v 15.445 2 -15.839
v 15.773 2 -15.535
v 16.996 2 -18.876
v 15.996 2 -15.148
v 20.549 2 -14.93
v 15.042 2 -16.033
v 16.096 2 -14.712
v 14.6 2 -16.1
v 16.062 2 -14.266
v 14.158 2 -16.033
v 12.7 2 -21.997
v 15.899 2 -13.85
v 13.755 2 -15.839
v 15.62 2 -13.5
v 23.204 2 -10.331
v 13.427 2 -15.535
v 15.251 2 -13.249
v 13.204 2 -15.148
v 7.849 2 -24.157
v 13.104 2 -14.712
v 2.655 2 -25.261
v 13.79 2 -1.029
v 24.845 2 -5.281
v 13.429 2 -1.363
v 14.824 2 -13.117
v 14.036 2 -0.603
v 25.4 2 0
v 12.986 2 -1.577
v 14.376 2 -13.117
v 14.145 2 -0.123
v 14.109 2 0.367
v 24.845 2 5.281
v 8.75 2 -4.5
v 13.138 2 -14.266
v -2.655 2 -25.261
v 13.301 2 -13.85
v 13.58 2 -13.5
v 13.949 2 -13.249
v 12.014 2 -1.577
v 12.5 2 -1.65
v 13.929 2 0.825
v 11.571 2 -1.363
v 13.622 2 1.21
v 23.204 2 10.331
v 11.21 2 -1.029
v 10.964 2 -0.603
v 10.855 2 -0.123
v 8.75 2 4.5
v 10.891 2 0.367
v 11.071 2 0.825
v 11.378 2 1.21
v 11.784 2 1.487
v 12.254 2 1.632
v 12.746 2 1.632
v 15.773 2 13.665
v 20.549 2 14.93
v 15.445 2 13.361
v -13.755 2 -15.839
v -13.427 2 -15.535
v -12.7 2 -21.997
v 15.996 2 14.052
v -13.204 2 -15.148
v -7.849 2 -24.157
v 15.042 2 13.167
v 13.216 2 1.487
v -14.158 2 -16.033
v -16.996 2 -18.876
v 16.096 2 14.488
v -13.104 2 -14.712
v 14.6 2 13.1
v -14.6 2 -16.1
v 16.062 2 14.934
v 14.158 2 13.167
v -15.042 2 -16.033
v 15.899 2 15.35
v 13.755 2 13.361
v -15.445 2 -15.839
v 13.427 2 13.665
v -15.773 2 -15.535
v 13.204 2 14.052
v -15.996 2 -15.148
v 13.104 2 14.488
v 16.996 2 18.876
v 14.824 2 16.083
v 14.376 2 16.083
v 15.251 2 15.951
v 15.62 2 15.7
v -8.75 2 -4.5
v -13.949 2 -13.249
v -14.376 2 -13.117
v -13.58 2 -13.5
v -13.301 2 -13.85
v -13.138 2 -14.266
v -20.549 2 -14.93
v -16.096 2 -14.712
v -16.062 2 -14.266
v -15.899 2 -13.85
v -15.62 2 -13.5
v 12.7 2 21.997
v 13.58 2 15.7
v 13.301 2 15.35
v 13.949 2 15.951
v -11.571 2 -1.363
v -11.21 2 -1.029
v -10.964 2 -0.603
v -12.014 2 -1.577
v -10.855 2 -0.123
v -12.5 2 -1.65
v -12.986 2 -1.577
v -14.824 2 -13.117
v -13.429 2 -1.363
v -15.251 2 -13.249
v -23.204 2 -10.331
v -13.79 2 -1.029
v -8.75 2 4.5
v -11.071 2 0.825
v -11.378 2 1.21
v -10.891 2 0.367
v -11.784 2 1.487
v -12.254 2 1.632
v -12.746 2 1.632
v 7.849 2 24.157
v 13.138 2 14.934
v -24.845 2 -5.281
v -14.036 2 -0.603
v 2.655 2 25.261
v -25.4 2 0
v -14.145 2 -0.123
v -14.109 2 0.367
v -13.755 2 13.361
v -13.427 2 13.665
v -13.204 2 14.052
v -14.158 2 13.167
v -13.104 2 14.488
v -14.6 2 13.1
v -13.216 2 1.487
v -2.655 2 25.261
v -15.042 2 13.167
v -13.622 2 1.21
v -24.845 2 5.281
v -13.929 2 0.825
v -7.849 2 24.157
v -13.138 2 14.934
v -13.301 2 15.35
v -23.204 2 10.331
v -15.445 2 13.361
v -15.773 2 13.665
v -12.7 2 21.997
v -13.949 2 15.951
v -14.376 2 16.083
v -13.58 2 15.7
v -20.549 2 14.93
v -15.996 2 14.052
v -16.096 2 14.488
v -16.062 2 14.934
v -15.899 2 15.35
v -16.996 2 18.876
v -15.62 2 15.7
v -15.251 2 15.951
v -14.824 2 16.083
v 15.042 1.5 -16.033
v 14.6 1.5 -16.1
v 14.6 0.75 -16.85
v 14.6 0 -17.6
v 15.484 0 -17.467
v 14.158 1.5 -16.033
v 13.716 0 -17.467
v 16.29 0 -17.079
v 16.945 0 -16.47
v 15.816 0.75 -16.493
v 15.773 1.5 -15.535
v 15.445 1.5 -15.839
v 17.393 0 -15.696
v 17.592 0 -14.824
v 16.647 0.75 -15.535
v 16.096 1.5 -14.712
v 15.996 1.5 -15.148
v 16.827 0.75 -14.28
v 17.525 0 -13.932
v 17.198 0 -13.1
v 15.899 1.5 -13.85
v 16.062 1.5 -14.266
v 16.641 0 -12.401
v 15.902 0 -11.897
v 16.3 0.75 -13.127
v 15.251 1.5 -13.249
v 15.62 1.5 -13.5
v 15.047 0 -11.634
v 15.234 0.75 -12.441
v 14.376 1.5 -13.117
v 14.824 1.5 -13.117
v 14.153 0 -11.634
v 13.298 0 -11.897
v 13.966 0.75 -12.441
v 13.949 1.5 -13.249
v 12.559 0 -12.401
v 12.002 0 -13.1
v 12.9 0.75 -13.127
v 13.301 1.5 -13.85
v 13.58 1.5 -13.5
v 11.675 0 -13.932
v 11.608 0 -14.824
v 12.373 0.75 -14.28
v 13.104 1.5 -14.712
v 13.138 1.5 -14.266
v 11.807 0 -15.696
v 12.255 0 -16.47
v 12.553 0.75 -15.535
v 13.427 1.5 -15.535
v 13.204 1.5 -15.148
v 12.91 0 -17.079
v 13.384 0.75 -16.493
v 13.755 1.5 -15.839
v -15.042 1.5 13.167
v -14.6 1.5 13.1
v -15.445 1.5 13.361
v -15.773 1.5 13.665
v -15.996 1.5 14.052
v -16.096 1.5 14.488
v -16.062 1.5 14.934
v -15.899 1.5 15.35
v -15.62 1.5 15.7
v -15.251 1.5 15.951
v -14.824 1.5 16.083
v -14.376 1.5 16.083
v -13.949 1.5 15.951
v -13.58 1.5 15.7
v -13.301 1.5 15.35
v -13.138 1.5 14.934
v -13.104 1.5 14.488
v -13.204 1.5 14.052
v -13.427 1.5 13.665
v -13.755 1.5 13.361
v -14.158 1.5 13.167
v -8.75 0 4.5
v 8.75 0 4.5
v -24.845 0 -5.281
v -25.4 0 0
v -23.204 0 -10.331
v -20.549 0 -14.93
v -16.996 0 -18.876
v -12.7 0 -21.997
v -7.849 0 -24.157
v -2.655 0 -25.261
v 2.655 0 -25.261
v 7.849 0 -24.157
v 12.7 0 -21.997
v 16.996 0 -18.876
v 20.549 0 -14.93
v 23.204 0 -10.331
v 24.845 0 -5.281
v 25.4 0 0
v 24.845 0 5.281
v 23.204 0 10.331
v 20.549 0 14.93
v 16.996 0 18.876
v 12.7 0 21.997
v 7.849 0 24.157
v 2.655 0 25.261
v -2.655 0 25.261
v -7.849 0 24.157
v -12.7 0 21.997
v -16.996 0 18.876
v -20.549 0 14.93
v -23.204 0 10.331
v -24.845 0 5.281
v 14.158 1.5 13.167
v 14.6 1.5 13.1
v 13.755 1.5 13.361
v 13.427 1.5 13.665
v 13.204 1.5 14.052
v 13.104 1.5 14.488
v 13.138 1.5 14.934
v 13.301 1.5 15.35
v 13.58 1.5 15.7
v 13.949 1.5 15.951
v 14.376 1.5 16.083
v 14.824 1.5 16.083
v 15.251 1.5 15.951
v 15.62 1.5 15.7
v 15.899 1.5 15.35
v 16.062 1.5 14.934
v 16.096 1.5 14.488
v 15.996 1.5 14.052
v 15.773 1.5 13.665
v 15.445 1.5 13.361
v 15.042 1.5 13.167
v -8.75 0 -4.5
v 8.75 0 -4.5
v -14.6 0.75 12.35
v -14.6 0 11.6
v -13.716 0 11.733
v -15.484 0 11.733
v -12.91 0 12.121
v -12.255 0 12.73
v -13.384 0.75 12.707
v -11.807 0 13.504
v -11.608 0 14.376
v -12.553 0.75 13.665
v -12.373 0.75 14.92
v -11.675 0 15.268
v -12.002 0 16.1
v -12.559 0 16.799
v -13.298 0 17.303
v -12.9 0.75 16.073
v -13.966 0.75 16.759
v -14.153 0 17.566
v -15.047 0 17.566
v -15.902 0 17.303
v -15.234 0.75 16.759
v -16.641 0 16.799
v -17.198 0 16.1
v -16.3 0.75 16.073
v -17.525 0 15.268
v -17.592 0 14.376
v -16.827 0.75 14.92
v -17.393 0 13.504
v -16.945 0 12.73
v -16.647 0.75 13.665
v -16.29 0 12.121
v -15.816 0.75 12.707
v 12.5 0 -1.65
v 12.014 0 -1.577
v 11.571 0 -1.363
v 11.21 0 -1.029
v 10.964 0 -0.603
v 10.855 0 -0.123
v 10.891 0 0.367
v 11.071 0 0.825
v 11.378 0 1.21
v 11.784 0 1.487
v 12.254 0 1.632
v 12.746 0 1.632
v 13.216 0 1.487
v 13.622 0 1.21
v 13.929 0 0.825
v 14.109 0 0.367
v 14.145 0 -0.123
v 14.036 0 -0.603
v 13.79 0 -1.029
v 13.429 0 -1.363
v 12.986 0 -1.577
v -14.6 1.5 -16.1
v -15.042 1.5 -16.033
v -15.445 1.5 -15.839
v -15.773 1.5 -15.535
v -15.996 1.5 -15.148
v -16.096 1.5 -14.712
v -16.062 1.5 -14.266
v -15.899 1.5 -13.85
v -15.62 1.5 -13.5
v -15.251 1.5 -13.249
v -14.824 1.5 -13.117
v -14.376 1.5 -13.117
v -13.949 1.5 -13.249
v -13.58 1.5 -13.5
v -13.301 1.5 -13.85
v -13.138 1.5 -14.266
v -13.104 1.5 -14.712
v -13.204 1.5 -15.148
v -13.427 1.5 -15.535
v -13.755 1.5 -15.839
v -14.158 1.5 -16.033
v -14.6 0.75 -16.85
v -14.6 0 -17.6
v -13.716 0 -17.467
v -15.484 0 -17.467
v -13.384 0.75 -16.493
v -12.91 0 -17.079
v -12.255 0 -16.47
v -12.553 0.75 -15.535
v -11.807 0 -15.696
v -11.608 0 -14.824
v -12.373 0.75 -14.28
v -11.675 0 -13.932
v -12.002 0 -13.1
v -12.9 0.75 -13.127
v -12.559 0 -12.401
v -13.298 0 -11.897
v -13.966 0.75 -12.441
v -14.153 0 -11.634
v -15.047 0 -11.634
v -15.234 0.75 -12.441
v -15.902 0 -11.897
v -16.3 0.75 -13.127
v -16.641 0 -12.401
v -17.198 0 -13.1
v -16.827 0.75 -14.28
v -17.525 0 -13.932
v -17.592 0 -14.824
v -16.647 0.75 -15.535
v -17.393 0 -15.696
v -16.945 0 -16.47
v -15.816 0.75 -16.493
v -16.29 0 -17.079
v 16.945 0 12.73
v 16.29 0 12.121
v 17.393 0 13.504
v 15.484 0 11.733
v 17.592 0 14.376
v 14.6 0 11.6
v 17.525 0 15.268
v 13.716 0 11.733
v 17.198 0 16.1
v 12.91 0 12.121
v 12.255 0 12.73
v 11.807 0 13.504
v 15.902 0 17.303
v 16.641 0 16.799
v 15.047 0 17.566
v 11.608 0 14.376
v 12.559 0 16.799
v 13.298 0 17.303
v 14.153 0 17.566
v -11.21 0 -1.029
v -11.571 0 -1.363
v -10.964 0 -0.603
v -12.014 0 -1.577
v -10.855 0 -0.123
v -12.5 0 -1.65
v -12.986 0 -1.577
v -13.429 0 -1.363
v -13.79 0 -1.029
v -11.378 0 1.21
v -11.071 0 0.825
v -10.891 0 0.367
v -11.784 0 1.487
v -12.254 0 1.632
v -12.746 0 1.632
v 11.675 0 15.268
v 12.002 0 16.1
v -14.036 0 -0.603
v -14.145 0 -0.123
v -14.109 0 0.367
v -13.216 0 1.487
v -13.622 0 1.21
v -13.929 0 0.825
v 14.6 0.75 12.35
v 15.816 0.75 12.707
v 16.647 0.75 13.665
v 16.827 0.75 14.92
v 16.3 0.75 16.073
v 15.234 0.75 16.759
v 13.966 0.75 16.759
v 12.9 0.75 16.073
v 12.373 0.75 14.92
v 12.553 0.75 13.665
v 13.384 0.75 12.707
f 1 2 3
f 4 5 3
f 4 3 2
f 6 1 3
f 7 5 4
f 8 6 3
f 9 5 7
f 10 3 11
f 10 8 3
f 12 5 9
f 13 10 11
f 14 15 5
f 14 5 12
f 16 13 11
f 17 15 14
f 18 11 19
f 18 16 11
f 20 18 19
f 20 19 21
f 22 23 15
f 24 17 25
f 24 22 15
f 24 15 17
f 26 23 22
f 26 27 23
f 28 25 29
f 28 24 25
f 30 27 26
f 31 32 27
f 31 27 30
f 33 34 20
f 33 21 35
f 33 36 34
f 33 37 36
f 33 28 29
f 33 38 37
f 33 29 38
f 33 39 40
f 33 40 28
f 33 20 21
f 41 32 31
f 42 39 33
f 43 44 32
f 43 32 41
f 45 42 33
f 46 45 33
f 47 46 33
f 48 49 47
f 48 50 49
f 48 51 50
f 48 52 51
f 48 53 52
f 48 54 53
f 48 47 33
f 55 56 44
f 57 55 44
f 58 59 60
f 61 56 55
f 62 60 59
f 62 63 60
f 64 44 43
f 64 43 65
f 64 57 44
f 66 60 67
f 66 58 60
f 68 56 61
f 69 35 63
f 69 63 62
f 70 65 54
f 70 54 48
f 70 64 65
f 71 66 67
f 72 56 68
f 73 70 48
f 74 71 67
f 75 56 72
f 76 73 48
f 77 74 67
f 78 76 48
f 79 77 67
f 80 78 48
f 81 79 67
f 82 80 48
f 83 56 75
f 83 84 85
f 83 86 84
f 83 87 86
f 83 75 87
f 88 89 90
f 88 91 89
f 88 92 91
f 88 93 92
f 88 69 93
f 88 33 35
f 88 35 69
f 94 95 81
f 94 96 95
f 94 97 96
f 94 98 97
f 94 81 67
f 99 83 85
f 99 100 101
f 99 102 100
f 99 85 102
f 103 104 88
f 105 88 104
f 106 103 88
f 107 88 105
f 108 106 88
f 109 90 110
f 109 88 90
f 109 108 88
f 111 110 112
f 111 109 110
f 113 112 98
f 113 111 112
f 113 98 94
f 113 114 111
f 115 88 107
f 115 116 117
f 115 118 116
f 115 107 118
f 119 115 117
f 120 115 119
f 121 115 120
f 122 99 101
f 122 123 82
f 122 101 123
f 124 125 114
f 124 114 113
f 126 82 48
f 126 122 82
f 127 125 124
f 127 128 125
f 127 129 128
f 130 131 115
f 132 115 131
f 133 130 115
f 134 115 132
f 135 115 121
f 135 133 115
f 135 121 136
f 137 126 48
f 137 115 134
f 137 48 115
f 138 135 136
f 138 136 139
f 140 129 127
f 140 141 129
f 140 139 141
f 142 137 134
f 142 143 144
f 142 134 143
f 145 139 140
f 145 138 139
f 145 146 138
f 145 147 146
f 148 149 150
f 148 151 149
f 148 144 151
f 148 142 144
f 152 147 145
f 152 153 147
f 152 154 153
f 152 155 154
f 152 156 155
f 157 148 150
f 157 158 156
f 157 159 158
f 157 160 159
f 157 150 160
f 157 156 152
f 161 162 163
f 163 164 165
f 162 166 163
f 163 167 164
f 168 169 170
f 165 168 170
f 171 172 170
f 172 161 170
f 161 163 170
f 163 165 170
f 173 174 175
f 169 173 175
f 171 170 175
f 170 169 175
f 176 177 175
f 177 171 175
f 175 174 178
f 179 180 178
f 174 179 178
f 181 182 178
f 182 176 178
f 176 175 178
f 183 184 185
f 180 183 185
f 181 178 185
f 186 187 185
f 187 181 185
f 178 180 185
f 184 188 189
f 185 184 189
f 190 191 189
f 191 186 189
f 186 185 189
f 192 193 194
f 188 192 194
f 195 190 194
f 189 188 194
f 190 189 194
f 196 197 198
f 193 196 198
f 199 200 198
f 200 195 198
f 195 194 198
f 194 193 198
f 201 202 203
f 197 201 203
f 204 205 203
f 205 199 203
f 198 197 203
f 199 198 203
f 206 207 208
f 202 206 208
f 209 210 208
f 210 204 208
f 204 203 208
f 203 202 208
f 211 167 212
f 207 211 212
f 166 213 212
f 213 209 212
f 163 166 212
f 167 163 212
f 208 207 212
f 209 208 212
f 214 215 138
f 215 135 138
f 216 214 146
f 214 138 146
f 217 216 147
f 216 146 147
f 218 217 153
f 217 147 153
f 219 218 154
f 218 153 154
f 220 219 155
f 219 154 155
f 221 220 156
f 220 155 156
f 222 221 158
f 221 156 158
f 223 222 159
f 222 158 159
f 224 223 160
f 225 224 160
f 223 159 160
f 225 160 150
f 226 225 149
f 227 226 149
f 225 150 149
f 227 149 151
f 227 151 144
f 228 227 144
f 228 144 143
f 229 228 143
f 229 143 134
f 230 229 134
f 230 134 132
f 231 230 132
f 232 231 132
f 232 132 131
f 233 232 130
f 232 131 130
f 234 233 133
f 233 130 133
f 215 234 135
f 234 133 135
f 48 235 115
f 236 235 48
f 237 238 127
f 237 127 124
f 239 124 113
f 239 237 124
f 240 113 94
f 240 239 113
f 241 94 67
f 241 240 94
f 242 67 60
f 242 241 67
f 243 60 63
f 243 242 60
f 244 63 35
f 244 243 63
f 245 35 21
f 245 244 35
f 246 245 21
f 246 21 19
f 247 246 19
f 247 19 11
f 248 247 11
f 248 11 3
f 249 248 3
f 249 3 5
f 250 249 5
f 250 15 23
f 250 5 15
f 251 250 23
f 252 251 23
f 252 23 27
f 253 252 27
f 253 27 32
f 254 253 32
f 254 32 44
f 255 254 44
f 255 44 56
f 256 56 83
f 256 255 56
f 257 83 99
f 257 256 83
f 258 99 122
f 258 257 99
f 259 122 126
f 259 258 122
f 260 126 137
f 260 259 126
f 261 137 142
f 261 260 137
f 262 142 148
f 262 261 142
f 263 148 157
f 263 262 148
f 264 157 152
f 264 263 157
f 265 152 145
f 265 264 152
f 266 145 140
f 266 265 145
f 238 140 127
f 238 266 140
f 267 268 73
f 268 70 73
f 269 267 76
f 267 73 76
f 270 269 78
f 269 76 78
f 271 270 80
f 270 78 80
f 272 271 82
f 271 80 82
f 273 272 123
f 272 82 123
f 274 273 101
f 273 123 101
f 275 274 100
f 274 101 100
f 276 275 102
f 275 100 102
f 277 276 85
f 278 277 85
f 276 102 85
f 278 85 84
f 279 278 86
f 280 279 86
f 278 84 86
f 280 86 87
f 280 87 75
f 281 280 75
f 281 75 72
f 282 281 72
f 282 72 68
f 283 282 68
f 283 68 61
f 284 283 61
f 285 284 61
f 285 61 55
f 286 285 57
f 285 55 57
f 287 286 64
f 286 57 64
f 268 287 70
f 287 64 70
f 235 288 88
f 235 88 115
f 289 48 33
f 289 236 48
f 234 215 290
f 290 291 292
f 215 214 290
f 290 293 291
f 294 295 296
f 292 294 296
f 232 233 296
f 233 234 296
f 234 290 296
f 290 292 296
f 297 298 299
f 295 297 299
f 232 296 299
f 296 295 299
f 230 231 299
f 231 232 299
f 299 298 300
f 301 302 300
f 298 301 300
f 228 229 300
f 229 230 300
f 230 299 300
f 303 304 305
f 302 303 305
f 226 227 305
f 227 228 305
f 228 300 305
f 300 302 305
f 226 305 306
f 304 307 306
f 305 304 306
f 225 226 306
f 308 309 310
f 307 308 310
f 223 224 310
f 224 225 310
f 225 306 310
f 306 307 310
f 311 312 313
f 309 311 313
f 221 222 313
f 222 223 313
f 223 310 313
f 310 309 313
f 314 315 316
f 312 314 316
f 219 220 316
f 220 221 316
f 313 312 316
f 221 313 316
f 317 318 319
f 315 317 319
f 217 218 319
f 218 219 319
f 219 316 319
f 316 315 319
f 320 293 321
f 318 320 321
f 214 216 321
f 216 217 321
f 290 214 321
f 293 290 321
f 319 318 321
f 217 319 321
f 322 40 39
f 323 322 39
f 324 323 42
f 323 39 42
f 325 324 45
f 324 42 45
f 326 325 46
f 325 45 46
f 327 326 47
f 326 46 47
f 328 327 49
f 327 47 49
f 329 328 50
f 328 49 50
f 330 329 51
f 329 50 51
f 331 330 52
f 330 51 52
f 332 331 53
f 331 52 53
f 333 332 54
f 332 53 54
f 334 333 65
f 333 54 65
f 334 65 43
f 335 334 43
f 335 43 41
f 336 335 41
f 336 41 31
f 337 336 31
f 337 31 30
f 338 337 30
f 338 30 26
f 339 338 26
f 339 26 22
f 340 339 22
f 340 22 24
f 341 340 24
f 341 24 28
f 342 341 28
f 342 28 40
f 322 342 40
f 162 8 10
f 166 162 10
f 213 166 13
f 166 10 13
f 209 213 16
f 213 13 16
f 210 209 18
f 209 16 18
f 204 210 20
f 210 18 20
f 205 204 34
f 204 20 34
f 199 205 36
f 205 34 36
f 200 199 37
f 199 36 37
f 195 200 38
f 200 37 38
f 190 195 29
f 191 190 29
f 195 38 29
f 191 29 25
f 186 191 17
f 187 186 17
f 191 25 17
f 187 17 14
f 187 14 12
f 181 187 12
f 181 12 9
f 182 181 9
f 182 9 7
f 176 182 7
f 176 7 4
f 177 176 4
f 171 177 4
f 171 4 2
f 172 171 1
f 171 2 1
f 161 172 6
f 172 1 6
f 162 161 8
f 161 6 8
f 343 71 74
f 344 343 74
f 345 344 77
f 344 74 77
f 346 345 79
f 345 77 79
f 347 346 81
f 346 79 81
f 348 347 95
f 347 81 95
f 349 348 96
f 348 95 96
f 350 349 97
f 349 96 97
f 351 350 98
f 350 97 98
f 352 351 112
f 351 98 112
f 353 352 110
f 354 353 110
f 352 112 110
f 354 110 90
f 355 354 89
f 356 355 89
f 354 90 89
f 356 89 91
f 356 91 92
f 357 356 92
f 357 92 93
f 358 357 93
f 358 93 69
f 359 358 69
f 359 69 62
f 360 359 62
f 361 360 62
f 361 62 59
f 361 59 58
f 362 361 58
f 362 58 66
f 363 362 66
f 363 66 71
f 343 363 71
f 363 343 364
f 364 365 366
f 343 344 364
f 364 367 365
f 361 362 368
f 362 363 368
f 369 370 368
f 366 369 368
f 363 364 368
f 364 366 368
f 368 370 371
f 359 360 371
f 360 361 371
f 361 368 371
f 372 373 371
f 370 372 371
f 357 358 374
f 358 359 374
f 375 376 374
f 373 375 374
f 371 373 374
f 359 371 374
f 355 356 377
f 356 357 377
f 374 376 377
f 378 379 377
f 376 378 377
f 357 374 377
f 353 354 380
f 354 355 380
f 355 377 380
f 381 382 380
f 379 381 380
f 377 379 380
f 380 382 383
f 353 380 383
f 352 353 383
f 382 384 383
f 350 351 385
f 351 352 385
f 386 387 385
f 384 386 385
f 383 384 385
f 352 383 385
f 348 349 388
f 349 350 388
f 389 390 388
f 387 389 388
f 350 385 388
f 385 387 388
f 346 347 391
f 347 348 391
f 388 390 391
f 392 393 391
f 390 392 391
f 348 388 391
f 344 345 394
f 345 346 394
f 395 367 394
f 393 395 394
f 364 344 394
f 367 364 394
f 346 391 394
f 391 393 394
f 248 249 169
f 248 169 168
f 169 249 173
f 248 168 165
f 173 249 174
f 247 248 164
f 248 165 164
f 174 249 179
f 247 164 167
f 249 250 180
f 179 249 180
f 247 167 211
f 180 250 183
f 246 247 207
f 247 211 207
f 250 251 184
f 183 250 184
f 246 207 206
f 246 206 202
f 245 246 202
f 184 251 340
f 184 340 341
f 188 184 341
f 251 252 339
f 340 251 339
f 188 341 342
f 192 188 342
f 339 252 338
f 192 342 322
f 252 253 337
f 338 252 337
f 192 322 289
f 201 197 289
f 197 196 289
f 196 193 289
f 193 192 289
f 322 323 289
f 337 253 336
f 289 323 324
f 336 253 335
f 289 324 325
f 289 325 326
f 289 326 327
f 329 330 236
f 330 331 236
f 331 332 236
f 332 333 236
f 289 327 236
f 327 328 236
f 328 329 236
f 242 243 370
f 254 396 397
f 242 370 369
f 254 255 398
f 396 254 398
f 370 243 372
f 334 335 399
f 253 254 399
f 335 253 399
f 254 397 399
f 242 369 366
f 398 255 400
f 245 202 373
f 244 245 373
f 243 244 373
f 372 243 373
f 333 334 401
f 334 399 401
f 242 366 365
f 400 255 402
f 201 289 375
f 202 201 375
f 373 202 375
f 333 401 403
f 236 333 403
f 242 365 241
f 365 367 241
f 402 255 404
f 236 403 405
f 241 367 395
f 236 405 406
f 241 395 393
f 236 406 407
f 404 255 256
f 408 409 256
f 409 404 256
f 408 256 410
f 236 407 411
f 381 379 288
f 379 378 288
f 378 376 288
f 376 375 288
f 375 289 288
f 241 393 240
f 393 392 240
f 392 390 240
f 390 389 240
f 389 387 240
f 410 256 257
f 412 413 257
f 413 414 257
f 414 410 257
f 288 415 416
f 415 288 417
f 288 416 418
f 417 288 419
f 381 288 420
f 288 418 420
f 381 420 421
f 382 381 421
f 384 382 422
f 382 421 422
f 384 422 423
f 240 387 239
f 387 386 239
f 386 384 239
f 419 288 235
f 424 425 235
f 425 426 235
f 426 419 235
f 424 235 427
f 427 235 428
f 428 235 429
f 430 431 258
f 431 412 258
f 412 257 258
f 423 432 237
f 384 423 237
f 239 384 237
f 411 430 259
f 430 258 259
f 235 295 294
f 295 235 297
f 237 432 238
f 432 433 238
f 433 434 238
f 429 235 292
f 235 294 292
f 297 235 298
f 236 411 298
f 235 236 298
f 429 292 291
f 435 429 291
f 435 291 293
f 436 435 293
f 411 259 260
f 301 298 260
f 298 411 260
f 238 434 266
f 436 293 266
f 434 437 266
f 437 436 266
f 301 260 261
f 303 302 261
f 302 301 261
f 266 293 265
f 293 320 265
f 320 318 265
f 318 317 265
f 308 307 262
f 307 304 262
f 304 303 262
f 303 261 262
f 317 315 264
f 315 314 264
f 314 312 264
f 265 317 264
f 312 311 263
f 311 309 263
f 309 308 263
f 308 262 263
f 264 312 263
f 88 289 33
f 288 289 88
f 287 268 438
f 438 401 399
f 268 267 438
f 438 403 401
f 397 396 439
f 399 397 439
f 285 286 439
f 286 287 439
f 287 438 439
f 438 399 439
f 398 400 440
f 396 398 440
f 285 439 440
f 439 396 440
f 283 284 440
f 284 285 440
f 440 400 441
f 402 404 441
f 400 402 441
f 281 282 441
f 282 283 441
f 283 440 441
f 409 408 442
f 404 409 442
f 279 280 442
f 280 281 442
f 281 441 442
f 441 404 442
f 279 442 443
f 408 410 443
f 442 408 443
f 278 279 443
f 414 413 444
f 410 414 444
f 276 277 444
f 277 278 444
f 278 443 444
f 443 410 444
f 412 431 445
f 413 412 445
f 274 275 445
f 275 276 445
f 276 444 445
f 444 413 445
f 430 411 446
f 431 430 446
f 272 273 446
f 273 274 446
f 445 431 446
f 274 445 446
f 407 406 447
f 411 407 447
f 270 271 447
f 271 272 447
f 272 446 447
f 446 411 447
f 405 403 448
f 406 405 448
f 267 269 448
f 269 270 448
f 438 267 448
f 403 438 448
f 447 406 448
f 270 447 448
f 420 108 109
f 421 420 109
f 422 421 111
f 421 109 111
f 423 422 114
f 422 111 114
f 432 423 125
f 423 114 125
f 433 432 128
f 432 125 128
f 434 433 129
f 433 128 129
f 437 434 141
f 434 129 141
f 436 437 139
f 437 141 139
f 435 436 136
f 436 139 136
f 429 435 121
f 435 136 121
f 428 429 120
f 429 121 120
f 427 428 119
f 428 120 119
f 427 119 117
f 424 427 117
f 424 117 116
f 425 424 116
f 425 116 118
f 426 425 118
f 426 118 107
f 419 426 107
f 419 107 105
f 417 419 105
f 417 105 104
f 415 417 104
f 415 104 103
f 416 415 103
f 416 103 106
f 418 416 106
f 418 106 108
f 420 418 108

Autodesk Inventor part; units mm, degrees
ref_plane "YZ Plane" through (0, 0, 0) normal (1, 0, 0) x (0, 1, 0)
ref_plane "XZ Plane" through (0, 0, 0) normal (0, 1, 0) x (-1, 0, 0)
ref_plane "XY Plane" through (0, 0, 0) normal (0, 0, 1) x (1, 0, 0)
sketch "Skizze1" plane through (0, 0, 0) normal (0, 1, 0) x (-1, 0, 0)
  circle A0 centre (0, 0) radius 25.4
  dimension "d0" = 50.8
extrude "Extrusion1" add sketch "Skizze1" along normal blind 2
sketch "Skizze2" plane through (0, 0, 0) normal (0, -1, 0) x (1, 0, 0)
  circle A0 centre (0, 0) radius 25.4 projected
  line L0 (-14.6, 14.6) -> (14.6, 14.6) construction
  line L1 (14.6, 14.6) -> (14.6, -14.6) construction
  line L2 (14.6, -14.6) -> (-14.6, -14.6) construction
  line L3 (-14.6, -14.6) -> (-14.6, 14.6) construction
  line L4 (0, 0) -> (14.6, 0) construction
  line L5 (0, 0) -> (0, 14.6) construction
  dimension "d3" = 29.2
  dimension "d4" = 29.2
hole "Bohrung1" at (-14.6, 0, 14.6) at (14.6, 0, 14.6) at (14.6, 0, -14.6) at (-14.6, 0, -14.6) direction (0, 1, 0) diameter 3 end through all countersink diameter 6 countersink angle 90
sketch "Skizze7" plane through (0, 0, 0) normal (0, -1, 0) x (1, 0, 0)
  circle A0 centre (0, 0) radius 25.4 projected
  line L0 (-8.75, 4.5) -> (8.75, 4.5)
  line L1 (8.75, 4.5) -> (8.75, -4.5)
  line L2 (8.75, -4.5) -> (-8.75, -4.5)
  line L3 (-8.75, -4.5) -> (-8.75, 4.5)
  line L4 (0, 0) -> (8.75, 0) construction
  line L5 (0, 0) -> (0, 4.5) construction
  line L6 (0, 0) -> (12.5, 0) construction
  line L7 (0, 0) -> (-12.5, 0) construction
  dimension "d25" = 17.5
  dimension "d26" = 9
  dimension "d28" = 12.5
  dimension "d29" = 12.5
extrude "Extrusion5" cut sketch "Skizze7" against normal blind 2 contours L0 L1 L2 L3
sketch "Skizze8" plane through (0, 0, 0) normal (0, -1, 0) x (1, 0, 0)
  circle A0 centre (0, 0) radius 25.4 projected
  line L0 (0, 0) -> (12.5, 0) construction
  line L1 (0, 0) -> (-12.5, 0) construction
  dimension "d32" = 12.5
  dimension "d33" = 12.5
hole "Bohrung2" at (-12.5, 0, 0) at (12.5, 0, 0) direction (0, 1, 0) diameter 3.3 end through all
properties part number "anschluss_daten"
